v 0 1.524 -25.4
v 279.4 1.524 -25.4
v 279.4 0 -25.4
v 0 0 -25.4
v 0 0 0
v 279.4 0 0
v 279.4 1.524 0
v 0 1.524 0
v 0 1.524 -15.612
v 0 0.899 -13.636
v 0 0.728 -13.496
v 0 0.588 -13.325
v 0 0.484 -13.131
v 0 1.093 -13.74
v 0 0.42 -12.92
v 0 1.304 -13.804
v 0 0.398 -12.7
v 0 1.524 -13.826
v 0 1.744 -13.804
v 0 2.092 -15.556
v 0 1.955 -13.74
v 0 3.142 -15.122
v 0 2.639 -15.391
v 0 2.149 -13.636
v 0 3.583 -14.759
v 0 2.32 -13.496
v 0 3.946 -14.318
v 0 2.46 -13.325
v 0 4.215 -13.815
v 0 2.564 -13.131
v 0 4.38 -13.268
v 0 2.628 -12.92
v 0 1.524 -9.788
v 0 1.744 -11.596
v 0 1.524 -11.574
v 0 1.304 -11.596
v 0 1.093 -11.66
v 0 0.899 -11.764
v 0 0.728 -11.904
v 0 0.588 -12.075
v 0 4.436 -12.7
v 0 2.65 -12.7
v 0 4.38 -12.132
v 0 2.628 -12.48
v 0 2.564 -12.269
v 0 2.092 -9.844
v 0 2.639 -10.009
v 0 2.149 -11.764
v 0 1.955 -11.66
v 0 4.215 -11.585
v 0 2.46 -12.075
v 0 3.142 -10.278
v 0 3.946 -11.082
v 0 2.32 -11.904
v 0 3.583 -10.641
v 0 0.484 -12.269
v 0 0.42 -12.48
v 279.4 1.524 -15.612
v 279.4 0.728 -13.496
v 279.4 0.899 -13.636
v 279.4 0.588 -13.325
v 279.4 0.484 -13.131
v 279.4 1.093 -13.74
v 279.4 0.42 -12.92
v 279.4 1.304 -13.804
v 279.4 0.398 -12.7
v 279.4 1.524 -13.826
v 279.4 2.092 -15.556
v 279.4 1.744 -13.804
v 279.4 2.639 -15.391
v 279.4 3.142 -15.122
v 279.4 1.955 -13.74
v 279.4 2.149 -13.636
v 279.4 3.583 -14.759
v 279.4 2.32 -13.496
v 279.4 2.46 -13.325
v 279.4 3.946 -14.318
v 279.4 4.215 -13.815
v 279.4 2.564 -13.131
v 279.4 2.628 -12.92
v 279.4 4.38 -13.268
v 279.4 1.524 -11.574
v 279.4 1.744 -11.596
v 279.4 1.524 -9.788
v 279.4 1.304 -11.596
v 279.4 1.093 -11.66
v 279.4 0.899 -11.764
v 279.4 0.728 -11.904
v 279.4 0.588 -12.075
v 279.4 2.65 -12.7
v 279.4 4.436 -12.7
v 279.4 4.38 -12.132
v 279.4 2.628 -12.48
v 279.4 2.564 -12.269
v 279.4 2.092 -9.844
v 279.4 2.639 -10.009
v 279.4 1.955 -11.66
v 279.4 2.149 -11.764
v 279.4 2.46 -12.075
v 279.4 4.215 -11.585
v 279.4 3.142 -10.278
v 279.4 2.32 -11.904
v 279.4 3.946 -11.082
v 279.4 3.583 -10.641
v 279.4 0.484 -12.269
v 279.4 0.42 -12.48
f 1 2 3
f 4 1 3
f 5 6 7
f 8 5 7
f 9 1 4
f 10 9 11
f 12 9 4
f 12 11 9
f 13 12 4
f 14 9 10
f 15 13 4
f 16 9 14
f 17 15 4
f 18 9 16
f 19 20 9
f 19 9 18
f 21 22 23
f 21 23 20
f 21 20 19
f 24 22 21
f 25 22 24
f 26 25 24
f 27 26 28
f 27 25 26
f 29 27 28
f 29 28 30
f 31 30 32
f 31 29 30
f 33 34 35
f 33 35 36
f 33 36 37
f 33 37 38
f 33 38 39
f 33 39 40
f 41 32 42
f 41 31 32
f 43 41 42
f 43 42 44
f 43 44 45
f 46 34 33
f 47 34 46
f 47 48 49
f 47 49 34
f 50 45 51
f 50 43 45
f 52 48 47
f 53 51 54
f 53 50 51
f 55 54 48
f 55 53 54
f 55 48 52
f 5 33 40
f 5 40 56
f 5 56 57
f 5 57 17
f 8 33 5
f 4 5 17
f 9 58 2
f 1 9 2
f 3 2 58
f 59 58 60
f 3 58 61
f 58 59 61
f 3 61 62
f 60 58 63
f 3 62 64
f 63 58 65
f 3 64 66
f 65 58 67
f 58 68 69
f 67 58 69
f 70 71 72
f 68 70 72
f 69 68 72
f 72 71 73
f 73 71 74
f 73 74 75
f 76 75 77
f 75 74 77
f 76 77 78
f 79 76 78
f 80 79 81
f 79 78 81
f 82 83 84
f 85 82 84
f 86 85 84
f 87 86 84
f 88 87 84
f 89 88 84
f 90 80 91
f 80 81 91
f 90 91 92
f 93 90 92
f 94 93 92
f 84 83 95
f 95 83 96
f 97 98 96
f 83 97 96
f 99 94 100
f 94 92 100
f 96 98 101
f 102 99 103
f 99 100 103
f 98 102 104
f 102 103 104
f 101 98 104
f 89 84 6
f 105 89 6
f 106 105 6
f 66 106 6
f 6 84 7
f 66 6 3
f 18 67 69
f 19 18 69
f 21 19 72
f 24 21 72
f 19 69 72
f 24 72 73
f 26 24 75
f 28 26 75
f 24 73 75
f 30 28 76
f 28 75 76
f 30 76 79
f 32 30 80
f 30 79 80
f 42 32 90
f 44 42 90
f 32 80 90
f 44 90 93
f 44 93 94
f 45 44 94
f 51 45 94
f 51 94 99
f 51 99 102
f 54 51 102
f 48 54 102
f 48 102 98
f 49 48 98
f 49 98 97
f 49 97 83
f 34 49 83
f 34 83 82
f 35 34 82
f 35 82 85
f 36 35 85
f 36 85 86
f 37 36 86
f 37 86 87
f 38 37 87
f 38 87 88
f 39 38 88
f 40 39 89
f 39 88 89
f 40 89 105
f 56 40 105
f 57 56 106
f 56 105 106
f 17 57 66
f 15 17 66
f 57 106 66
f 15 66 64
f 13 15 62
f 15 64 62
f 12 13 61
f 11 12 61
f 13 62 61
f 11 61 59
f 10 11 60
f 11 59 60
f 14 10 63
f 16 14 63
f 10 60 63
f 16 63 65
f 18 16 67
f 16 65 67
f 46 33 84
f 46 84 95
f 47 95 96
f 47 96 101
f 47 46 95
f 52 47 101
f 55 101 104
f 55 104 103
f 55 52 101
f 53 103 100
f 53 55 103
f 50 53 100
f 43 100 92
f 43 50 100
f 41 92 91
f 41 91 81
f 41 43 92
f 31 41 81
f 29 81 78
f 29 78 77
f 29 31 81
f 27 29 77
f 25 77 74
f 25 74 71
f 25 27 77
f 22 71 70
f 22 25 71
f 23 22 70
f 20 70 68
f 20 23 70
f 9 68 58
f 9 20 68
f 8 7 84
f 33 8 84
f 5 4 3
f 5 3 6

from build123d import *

# Parameters (mm, degrees)
BOSS_EXTRUDE1_DEPTH = 279.4
CUT_EXTRUDE1_REACH  = 281.4
SKETCH2_R           = 1.125613493


with BuildPart() as part:
    # Sketch1 → Boss-Extrude1 (new body)
    with BuildSketch(Plane(origin=(0, 0, 0), x_dir=(0, 0, -1), z_dir=(1, 0, 0))):
        with BuildLine():
            Line((15.612422091, 1.524), (25.4, 1.524))
            Line((25.4, 1.524), (25.4, 0))
            Line((25.4, 0), (0, 0))
            Line((0, 0), (0, 1.524))
            Line((0, 1.524), (9.787577909, 1.524))
            ThreePointArc((9.787577909, 1.524), (12.7, 4.436422091), (15.612422091, 1.524))
        make_face()
    extrude(amount=BOSS_EXTRUDE1_DEPTH)

    # Sketch2 → Cut-Extrude1 (cut, up to next)
    with BuildSketch(Plane(origin=(279.4, 0, 0), x_dir=(0, 0, -1), z_dir=(1, 0, 0)), mode=Mode.PRIVATE) as cut_extrude1_sk1:
        with Locations((12.7, 1.524)):
            Circle(SKETCH2_R)
    cut_extrude1_tool1 = extrude(cut_extrude1_sk1.sketch, amount=-CUT_EXTRUDE1_REACH, mode=Mode.PRIVATE) & part.part
    add(cut_extrude1_tool1.solids().sort_by_distance((279.4, 1.524, -12.7))[0], mode=Mode.SUBTRACT)


solid = part.part
